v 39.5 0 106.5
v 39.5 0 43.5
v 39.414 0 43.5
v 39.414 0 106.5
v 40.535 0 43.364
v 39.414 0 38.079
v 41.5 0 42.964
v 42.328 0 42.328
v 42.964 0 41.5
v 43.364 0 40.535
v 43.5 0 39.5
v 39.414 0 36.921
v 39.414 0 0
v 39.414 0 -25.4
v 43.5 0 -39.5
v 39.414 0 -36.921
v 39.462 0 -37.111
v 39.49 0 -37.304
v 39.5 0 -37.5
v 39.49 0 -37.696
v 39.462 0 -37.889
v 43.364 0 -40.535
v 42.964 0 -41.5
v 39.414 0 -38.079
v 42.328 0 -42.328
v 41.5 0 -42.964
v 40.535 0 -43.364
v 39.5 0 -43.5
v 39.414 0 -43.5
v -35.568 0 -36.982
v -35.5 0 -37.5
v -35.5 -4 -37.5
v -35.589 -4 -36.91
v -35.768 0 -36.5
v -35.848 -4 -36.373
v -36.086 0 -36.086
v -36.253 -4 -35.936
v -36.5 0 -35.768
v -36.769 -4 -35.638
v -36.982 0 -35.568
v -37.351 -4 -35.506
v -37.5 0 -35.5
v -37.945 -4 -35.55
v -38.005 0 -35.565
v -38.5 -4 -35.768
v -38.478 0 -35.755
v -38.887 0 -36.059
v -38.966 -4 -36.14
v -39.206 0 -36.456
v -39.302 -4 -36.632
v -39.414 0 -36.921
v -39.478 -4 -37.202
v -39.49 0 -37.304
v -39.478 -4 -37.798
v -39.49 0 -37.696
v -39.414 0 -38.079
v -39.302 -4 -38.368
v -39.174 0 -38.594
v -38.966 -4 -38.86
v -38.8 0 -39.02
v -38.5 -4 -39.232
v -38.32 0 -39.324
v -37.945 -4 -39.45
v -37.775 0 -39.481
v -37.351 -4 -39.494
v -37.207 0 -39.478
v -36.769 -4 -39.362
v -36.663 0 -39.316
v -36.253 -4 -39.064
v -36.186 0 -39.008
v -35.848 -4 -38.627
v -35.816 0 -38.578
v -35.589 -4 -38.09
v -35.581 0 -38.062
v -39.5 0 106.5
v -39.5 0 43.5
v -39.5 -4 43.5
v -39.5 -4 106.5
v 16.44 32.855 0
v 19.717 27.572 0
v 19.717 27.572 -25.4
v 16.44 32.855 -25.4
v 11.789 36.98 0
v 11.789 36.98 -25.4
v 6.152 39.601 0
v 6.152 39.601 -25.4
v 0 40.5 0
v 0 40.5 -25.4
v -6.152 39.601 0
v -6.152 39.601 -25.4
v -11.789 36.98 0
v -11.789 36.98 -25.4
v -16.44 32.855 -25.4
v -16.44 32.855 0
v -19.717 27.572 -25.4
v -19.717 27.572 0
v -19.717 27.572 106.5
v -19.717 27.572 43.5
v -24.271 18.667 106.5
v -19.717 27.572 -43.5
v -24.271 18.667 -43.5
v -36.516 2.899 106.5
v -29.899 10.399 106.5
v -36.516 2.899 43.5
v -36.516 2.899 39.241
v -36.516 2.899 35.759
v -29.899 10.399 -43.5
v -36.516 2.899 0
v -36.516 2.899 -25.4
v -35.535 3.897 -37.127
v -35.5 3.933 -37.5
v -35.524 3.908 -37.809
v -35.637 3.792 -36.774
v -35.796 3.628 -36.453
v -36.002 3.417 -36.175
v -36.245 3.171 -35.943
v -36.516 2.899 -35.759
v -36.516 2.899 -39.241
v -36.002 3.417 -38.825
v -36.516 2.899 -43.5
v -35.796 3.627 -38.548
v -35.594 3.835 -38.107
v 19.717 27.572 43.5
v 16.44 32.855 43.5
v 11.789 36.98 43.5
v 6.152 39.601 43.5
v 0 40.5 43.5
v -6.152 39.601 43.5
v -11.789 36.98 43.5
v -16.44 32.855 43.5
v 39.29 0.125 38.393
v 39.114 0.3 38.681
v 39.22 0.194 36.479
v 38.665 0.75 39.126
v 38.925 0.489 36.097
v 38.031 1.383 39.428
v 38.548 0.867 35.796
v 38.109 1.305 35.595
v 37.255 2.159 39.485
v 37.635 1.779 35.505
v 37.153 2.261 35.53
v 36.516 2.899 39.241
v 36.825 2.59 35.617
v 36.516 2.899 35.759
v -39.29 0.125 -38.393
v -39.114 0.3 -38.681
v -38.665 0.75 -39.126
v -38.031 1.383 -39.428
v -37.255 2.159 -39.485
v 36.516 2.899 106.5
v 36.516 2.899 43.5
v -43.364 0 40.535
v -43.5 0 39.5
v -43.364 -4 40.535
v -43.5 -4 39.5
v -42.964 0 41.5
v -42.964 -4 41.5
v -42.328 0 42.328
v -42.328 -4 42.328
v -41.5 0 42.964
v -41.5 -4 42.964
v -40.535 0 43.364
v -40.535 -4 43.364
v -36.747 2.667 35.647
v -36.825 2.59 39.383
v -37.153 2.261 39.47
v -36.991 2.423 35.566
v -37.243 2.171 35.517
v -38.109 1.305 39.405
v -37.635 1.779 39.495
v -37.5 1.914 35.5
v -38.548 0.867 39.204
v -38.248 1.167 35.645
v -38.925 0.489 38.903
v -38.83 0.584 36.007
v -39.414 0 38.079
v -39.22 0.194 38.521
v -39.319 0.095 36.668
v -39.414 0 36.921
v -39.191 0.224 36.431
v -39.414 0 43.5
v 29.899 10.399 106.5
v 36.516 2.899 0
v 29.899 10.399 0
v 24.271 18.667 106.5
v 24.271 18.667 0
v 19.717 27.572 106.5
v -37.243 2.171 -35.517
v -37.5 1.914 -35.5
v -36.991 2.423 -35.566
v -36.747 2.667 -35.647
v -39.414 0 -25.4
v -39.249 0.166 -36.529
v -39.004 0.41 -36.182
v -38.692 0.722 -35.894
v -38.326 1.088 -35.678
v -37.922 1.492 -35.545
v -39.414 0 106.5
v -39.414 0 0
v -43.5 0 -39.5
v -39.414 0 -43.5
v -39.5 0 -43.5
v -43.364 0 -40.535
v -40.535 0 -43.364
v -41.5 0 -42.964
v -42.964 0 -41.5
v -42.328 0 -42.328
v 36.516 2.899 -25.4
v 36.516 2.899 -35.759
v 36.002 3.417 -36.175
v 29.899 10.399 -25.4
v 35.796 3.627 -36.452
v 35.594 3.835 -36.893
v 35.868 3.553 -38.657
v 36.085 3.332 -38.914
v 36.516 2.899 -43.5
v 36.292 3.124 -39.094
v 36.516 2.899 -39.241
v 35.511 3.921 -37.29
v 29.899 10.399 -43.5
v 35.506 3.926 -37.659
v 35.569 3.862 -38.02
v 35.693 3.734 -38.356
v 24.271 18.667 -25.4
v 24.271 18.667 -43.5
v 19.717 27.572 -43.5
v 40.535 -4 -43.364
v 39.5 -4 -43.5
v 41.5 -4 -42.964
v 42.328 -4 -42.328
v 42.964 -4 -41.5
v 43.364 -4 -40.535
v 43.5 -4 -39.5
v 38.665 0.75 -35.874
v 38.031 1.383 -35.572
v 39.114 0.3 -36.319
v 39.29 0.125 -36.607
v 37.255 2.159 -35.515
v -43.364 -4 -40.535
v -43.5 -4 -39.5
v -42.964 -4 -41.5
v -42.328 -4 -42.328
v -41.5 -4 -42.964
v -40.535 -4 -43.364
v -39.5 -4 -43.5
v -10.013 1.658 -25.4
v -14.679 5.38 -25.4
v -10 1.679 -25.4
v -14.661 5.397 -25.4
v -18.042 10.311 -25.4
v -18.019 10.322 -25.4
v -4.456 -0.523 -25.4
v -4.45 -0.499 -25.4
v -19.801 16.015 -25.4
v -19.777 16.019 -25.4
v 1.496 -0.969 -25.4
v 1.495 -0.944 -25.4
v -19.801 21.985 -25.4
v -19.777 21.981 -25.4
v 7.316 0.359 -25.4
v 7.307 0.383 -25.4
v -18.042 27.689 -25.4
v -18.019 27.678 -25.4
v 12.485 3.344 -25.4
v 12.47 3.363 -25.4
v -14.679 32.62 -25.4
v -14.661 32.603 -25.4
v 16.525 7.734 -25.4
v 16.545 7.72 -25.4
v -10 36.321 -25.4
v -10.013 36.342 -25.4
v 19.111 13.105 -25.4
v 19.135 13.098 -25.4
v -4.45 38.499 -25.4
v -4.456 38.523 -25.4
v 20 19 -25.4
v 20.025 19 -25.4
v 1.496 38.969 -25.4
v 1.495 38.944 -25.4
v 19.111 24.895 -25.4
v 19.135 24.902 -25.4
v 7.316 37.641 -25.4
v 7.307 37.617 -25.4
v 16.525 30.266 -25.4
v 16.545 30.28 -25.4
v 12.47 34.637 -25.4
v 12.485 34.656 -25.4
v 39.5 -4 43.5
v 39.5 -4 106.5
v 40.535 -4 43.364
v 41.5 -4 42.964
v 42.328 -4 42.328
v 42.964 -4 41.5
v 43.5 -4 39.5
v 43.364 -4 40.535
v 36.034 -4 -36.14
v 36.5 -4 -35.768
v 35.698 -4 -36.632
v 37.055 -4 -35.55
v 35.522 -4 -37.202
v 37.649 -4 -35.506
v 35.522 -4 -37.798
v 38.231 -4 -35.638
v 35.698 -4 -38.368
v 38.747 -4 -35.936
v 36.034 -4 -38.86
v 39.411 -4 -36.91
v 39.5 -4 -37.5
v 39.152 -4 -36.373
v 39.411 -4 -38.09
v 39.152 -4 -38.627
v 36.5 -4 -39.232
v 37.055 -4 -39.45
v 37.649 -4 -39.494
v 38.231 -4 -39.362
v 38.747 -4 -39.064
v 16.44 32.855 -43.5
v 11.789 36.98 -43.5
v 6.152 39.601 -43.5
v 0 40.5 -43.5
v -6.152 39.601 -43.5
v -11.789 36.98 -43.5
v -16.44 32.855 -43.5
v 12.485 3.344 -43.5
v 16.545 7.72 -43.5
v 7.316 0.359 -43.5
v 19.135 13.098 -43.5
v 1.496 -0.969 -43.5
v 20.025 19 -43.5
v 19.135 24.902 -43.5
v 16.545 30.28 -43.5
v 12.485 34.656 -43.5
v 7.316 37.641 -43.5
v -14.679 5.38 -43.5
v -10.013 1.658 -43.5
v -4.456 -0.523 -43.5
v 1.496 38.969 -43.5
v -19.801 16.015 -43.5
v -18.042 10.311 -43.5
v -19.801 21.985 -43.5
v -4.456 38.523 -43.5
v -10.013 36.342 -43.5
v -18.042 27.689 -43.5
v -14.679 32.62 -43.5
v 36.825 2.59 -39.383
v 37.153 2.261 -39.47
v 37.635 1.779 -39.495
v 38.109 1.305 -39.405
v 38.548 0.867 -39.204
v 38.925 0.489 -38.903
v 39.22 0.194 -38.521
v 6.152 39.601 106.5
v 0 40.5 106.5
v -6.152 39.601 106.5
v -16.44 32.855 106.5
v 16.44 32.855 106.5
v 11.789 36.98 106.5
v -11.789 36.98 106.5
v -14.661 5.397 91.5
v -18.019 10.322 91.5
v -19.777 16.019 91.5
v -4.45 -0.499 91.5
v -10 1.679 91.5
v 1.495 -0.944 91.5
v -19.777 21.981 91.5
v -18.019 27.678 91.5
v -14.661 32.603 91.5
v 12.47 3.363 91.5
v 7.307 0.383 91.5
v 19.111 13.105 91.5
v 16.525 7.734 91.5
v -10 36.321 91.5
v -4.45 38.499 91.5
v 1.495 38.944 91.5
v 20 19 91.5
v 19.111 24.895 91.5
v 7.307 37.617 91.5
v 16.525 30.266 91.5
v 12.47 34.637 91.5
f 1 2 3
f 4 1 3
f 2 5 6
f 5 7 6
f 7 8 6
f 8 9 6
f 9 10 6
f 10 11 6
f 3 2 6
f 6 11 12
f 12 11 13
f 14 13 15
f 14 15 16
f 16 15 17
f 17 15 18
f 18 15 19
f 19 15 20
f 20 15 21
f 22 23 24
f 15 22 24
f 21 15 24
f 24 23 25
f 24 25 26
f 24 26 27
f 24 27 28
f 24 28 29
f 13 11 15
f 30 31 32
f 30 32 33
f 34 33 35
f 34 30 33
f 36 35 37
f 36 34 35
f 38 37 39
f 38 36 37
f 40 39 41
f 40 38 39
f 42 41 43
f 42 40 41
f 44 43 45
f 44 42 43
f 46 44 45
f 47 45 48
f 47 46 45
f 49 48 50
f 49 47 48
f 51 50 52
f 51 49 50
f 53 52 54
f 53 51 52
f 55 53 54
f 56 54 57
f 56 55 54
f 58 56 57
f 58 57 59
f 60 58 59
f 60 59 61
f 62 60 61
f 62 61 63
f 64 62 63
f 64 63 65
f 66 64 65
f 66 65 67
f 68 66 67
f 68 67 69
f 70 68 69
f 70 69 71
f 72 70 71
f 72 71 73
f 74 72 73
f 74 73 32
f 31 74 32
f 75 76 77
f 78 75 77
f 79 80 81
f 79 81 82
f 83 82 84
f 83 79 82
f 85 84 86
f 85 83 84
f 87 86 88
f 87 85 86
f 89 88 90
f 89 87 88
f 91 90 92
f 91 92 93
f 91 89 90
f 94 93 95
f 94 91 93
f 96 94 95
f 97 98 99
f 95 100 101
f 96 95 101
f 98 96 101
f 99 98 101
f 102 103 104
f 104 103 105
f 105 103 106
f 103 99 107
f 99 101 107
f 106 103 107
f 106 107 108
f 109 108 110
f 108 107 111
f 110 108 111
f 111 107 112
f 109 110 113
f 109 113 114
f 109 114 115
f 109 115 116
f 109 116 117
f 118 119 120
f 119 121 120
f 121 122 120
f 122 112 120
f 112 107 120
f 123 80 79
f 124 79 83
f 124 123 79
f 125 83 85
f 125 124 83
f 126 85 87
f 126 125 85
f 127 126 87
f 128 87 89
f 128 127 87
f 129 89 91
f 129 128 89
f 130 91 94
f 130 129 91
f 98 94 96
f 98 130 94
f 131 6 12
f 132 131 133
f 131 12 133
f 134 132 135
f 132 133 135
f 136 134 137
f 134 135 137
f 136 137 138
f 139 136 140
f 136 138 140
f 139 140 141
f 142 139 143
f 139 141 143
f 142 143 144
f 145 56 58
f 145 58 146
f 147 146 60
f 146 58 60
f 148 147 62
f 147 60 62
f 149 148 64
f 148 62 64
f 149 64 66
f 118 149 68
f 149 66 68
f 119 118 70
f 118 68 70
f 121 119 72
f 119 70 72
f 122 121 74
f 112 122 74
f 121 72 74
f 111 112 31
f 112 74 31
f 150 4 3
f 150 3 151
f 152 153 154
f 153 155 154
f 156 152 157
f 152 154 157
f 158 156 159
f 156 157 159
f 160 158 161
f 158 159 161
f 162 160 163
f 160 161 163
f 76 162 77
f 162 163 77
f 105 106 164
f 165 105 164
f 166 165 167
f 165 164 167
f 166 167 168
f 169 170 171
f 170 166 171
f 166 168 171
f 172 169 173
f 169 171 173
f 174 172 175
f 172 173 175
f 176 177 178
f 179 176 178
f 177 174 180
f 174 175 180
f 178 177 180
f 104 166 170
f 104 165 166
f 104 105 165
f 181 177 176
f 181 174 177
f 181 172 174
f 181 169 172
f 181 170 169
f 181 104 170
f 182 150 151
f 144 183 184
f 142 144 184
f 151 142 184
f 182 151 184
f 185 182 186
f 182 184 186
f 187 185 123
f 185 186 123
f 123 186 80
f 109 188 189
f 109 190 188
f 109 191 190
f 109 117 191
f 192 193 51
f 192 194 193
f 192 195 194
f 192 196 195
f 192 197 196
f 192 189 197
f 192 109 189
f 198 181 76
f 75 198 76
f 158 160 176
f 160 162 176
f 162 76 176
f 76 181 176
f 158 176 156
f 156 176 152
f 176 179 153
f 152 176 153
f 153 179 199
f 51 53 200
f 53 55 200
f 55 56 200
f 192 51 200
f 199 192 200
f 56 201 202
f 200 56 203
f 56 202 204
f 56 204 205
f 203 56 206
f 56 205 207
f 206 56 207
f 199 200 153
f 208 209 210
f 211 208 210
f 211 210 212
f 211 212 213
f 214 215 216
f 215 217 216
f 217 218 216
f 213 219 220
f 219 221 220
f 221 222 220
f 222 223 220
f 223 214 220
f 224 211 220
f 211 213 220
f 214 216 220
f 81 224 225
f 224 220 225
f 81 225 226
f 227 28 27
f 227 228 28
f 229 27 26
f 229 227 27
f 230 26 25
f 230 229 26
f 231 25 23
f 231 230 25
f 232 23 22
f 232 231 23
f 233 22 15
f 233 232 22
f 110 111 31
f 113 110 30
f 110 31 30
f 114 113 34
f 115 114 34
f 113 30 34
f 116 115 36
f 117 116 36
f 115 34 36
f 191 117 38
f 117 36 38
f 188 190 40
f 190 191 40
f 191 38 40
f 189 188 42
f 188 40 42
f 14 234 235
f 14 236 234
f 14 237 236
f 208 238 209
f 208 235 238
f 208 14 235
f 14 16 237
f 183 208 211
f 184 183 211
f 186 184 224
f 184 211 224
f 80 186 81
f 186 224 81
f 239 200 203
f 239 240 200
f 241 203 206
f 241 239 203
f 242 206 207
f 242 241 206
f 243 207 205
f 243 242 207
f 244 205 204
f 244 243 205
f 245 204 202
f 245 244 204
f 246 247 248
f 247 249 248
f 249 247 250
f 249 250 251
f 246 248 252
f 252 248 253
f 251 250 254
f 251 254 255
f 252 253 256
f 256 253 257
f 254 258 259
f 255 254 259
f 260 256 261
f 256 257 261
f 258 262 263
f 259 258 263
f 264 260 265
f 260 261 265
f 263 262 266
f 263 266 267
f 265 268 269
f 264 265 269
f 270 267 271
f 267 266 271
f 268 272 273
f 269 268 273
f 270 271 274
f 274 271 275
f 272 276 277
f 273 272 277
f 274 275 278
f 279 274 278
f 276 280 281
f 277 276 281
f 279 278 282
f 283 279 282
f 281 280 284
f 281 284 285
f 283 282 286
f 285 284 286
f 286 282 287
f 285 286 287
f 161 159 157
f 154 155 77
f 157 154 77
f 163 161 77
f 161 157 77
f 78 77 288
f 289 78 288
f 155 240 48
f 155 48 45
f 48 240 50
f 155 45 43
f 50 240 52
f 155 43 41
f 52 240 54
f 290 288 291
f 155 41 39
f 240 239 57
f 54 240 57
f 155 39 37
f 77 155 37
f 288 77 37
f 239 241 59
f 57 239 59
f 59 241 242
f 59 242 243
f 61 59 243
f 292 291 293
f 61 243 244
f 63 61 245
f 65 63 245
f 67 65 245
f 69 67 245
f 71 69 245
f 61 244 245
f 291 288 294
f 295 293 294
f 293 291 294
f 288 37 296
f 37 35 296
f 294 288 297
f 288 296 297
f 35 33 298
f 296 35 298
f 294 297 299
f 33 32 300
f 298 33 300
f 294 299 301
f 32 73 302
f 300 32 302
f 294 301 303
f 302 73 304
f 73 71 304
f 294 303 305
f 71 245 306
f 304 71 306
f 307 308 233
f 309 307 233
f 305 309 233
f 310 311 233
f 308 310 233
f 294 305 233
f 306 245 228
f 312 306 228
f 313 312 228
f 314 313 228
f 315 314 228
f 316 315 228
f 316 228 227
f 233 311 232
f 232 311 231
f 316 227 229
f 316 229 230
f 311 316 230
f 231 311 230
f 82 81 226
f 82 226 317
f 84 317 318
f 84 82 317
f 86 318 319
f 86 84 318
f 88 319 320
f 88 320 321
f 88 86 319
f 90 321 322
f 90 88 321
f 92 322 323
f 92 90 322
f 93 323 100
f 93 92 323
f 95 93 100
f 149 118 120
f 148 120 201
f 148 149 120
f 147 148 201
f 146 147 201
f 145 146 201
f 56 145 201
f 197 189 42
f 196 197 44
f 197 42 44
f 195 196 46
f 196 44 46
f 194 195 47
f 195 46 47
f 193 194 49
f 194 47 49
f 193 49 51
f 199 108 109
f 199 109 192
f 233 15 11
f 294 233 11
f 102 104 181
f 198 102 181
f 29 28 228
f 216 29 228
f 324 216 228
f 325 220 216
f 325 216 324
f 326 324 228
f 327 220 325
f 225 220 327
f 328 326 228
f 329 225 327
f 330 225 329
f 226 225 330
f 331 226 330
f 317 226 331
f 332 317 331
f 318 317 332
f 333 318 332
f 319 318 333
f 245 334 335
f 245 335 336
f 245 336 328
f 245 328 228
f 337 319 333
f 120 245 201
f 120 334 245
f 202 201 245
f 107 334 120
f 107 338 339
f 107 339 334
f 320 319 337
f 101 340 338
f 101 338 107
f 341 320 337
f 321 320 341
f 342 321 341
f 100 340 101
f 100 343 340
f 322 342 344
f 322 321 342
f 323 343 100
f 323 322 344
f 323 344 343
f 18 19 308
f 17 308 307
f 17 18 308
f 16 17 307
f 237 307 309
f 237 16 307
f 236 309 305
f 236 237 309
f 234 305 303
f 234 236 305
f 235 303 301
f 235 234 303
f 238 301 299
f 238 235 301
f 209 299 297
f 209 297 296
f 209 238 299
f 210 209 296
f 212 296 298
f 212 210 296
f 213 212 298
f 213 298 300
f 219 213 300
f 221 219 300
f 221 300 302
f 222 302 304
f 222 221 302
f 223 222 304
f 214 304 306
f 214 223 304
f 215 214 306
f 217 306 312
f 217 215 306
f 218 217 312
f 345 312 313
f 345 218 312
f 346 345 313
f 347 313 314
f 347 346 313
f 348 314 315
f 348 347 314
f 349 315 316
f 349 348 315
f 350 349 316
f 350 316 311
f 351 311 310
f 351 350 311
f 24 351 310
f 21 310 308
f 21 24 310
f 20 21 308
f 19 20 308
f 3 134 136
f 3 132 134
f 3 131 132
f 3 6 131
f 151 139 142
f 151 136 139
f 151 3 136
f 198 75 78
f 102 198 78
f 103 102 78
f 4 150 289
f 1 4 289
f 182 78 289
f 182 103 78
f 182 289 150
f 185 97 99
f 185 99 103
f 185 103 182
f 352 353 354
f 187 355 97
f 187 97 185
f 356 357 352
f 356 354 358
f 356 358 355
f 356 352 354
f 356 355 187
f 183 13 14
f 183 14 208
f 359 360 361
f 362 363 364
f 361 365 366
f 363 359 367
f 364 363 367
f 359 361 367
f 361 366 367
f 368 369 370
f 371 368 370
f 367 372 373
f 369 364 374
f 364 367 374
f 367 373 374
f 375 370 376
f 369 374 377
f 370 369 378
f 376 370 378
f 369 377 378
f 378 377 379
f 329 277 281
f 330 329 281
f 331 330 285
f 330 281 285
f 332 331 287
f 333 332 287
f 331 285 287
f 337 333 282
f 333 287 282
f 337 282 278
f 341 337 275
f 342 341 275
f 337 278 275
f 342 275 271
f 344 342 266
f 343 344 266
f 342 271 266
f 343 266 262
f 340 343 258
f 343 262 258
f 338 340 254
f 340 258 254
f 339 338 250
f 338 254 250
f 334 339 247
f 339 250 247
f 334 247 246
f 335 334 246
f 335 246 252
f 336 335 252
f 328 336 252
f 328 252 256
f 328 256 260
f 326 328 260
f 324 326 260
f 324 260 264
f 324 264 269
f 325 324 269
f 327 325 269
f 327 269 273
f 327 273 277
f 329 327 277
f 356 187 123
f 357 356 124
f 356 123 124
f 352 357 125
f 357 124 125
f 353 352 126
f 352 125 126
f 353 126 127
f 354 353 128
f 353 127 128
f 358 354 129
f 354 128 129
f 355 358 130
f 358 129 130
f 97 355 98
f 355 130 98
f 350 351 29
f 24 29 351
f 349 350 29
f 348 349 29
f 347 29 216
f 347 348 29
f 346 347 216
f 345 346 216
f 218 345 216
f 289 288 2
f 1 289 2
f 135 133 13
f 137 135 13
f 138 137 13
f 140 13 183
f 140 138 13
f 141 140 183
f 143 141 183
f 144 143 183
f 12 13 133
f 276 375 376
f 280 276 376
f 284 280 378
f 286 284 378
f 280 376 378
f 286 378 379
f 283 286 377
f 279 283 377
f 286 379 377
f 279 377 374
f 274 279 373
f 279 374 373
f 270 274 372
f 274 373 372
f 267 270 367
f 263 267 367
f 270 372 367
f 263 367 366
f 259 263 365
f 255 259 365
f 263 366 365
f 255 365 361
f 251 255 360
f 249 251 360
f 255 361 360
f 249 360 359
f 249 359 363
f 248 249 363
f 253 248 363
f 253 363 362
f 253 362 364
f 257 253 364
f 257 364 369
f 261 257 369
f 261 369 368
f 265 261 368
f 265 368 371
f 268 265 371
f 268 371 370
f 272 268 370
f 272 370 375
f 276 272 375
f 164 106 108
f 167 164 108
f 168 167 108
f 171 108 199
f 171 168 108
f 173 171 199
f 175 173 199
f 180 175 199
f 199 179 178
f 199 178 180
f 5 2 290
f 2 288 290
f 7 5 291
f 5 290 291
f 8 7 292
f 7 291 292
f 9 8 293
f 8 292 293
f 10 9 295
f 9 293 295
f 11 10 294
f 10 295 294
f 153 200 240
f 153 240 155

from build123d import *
from build123d import SkipClean  # not in build123d's __all__

# Parameters (mm, degrees)
F0_W           = 87
F0_H           = 87
F0_R           = 2
F1_DEPTH       = 4
F2_R           = 4
F5_DEPTH       = 43.5
F6_T1_DEPTH    = 87
F7_R           = 20.025
F8_DEPTH       = 87.001
F9_R           = 2
F10_DEPTH      = 40.501
F11_R          = 20
F12_DEPTH      = 10
F15_DEPTH      = 106.5
F15_DEPTH_BACK = 25.4
F16_R          = 20
F17_DEPTH      = 150.0010001
F18_R          = 20
F19_DEPTH      = 15


# Not quite as in the source:
# - a fillet or chamfer that OpenCascade refuses, or shapes differently, is made with other operations: its cross-section is extruded or revolved along the edge and cut away or added
# - after a boolean that leaves OpenCascade's solid faulty, fix() repairs it


with BuildPart() as f1:
    # F0 (on Front) → F1 (new body)
    with BuildSketch(Plane.XZ):
        Rectangle(F0_W, F0_H)
        with Locations((-37.5, -37.5)):
            Circle(F0_R, mode=Mode.SUBTRACT)
        with Locations((37.5, -37.5)):
            Circle(F0_R, mode=Mode.SUBTRACT)
        with Locations((-37.5, 37.5)):
            Circle(F0_R, mode=Mode.SUBTRACT)
        with Locations((37.5, 37.5)):
            Circle(F0_R, mode=Mode.SUBTRACT)
    extrude(amount=F1_DEPTH)

    # F2
    f2_edges = [f1.edges().sort_by_distance(p)[0] for p in [
        (43.5, -2, 43.5),
        (-43.5, -2, 43.5),
        (43.5, -2, -43.5),
        (-43.5, -2, -43.5),
    ]]
    fillet(f2_edges, radius=F2_R)

    # F4 (on Top) → F5 (join, symmetric)
    with BuildSketch(Plane.XY):
        with BuildLine():
            ThreePointArc((-10.0623058987, 0), (-17.7800410903, 6.9119836686), (-21.3690774705, 16.6309225295))
            Line((-21.3690774705, 16.6309225295), (-38, 0))
            Line((-38, 0), (-10.0623058987, 0))
        make_face()
        with BuildLine():
            Line((-38, 0), (-21.3690774705, 16.6309225295))
            ThreePointArc((-21.3690774705, 16.6309225295), (-21.4314768317, 17.2848321331), (-21.4738707868, 17.9403427756))
            Line((-21.4738707868, 17.9403427756), (-39.4142135624, 0))
            Line((-39.4142135624, 0), (-38, 0))
        make_face()
        with BuildLine():
            ThreePointArc((-21.4738707868, 17.9403427756), (-21.4314768317, 17.2848321331), (-21.3690774705, 16.6309225295))
            ThreePointArc((-21.3690774705, 16.6309225295), (-17.7800410903, 6.9119836686), (-10.0623058987, 0))
            Line((-10.0623058987, 0), (10.0623058987, 0))
            ThreePointArc((10.0623058987, 0), (17.7800410903, 6.9119836686), (21.3690774705, 16.6309225295))
            ThreePointArc((21.3690774705, 16.6309225295), (21.4314768317, 17.2848321331), (21.4738707868, 17.9403427756))
            Line((21.4738707868, 17.9403427756), (19.9956189847, 19.4185945777))
            ThreePointArc((19.9956189847, 19.4185945777), (13.9933575036, 33.2893647786), (0, 39))
            ThreePointArc((0, 39), (-13.9933575036, 33.2893647786), (-19.9956189847, 19.4185945777))
            Line((-19.9956189847, 19.4185945777), (-21.4738707868, 17.9403427756))
        make_face()
        with BuildLine():
            ThreePointArc((21.5, 19), (-0.5299896624, 40.493466704), (-21.4738707868, 17.9403427756))
            Line((-21.4738707868, 17.9403427756), (-19.9956189847, 19.4185945777))
            ThreePointArc((-19.9956189847, 19.4185945777), (-13.9933575036, 33.2893647786), (0, 39))
            ThreePointArc((0, 39), (13.9933575036, 33.2893647786), (19.9956189847, 19.4185945777))
            Line((19.9956189847, 19.4185945777), (21.4738707868, 17.9403427756))
            ThreePointArc((21.4738707868, 17.9403427756), (21.493466704, 18.4700103376), (21.5, 19))
        make_face()
        with BuildLine():
            Line((10.0623058987, 0), (-10.0623058987, 0))
            ThreePointArc((-10.0623058987, 0), (0, -2.5), (10.0623058987, 0))
        make_face()
        with BuildLine():
            ThreePointArc((21.3690774705, 16.6309225295), (17.7800410903, 6.9119836686), (10.0623058987, 0))
            Line((10.0623058987, 0), (38, 0))
            Line((38, 0), (21.3690774705, 16.6309225295))
        make_face()
        with BuildLine():
            Line((39.4142135624, 0), (21.4738707868, 17.9403427756))
            ThreePointArc((21.4738707868, 17.9403427756), (21.4314768317, 17.2848321331), (21.3690774705, 16.6309225295))
            Line((21.3690774705, 16.6309225295), (38, 0))
            Line((38, 0), (39.4142135624, 0))
        make_face()
    extrude(amount=F5_DEPTH, both=True)

    # F6: fillet of radius 80 on 2 edges, made by hand

    # F6_s2 → F6_t1 (join)
    with BuildSketch(Plane.XY.offset(-43.5)):
        with BuildLine():
            ThreePointArc((-36.5156161223, 2.89859744), (-26.9555540815, 14.444838104), (-19.7173340913, 27.5718572276))
            ThreePointArc((-19.7173340913, 27.5718572276), (-21.1511313524, 22.857413967), (-21.4738707868, 17.9403427756))
            Line((-21.4738707868, 17.9403427756), (-36.5156161223, 2.89859744))
        make_face()
        with BuildLine():
            ThreePointArc((19.7173340913, 27.5718572276), (26.9555540815, 14.444838104), (36.5156161223, 2.89859744))
            Line((36.5156161223, 2.89859744), (21.4738707868, 17.9403427756))
            ThreePointArc((21.4738707868, 17.9403427756), (21.1511313524, 22.857413967), (19.7173340913, 27.5718572276))
        make_face()
    extrude(amount=F6_T1_DEPTH)

    # F7 (on face) → F8 (cut, through all)
    with BuildSketch(Plane.XY.offset(43.5)):
        with Locations((0, 19)):
            Circle(F7_R)
    extrude(amount=-F8_DEPTH, mode=Mode.SUBTRACT)

    # F9 (on Front) → F10 (cut, through all)
    with BuildSketch(Plane.XZ):
        with BuildLine():
            Line((-37.5, 35.5), (-37.5, 37.5))
            Line((-37.5, 37.5), (-35.5, 37.5))
            ThreePointArc((-35.5, 37.5), (-38.9142135624, 38.9142135624), (-37.5, 35.5))
        make_face()
        with BuildLine():
            Line((-35.5, 37.5), (-37.5, 37.5))
            Line((-37.5, 37.5), (-37.5, 35.5))
            ThreePointArc((-37.5, 35.5), (-36.0857864376, 36.0857864376), (-35.5, 37.5))
        make_face()
        with BuildLine():
            ThreePointArc((39.5, 37.5), (37.5, 39.5), (35.5, 37.5))
            ThreePointArc((35.5, 37.5), (37.5, 35.5), (39.5, 37.5))
        make_face()
        with BuildLine():
            ThreePointArc((-35.5, -37.5), (-36.0857864376, -36.0857864376), (-37.5, -35.5))
            ThreePointArc((-37.5, -35.5), (-38.9142135624, -38.9142135624), (-35.5, -37.5))
        make_face()
        with Locations((37.5, -37.5)):
            Circle(F9_R)
    with SkipClean():  # cleaning this boolean's faces spoils the solid; the shape is the same uncleaned
        extrude(amount=-F10_DEPTH, mode=Mode.SUBTRACT)

    # F14 (on Top) → F15 (join, two sides)
    with BuildSketch(Plane.XY) as f15_sk:
        with BuildLine():
            Line((-39.5, -4), (39.5, -4))
            Line((39.5, -4), (39.5, 0))
            Line((39.5, 0), (39.4142135624, 0))
            Line((39.4142135624, 0), (36.5156161223, 2.89859744))
            ThreePointArc((36.5156161223, 2.89859744), (26.9555540815, 14.444838104), (19.7173340913, 27.5718572276))
            ThreePointArc((19.7173340913, 27.5718572276), (0, 40.5), (-19.7173340913, 27.5718572276))
            ThreePointArc((-19.7173340913, 27.5718572276), (-26.9555540815, 14.444838104), (-36.5156161223, 2.89859744))
            Line((-36.5156161223, 2.89859744), (-39.4142135624, 0))
            Line((-39.4142135624, 0), (-39.5, 0))
            Line((-39.5, 0), (-39.5, -4))
        make_face()
    extrude(amount=F15_DEPTH)
    extrude(f15_sk.sketch, amount=-F15_DEPTH_BACK)

    add(f1.part.fix(), mode=Mode.REPLACE)

    # F16 (on face) → F17 (cut, through all)
    with BuildSketch(Plane.XY.offset(106.5)):
        with Locations((0, 19)):
            Circle(F16_R)
    extrude(amount=-F17_DEPTH, mode=Mode.SUBTRACT)

    # F18 (on face) → F19 (join)
    with BuildSketch(Plane.XY.offset(106.5)):
        with Locations((0, 19)):
            Circle(F18_R)
    extrude(amount=-F19_DEPTH)


with BuildPart() as f12:
    # F11 (on face) → F12 (new body)
    with BuildSketch(Plane(origin=(0, 0, -43.5), x_dir=(1, 0, 0), z_dir=(0, 0, -1))):
        with Locations((0, -19)):
            Circle(F11_R)
    extrude(amount=-F12_DEPTH)


solid = f1.part
